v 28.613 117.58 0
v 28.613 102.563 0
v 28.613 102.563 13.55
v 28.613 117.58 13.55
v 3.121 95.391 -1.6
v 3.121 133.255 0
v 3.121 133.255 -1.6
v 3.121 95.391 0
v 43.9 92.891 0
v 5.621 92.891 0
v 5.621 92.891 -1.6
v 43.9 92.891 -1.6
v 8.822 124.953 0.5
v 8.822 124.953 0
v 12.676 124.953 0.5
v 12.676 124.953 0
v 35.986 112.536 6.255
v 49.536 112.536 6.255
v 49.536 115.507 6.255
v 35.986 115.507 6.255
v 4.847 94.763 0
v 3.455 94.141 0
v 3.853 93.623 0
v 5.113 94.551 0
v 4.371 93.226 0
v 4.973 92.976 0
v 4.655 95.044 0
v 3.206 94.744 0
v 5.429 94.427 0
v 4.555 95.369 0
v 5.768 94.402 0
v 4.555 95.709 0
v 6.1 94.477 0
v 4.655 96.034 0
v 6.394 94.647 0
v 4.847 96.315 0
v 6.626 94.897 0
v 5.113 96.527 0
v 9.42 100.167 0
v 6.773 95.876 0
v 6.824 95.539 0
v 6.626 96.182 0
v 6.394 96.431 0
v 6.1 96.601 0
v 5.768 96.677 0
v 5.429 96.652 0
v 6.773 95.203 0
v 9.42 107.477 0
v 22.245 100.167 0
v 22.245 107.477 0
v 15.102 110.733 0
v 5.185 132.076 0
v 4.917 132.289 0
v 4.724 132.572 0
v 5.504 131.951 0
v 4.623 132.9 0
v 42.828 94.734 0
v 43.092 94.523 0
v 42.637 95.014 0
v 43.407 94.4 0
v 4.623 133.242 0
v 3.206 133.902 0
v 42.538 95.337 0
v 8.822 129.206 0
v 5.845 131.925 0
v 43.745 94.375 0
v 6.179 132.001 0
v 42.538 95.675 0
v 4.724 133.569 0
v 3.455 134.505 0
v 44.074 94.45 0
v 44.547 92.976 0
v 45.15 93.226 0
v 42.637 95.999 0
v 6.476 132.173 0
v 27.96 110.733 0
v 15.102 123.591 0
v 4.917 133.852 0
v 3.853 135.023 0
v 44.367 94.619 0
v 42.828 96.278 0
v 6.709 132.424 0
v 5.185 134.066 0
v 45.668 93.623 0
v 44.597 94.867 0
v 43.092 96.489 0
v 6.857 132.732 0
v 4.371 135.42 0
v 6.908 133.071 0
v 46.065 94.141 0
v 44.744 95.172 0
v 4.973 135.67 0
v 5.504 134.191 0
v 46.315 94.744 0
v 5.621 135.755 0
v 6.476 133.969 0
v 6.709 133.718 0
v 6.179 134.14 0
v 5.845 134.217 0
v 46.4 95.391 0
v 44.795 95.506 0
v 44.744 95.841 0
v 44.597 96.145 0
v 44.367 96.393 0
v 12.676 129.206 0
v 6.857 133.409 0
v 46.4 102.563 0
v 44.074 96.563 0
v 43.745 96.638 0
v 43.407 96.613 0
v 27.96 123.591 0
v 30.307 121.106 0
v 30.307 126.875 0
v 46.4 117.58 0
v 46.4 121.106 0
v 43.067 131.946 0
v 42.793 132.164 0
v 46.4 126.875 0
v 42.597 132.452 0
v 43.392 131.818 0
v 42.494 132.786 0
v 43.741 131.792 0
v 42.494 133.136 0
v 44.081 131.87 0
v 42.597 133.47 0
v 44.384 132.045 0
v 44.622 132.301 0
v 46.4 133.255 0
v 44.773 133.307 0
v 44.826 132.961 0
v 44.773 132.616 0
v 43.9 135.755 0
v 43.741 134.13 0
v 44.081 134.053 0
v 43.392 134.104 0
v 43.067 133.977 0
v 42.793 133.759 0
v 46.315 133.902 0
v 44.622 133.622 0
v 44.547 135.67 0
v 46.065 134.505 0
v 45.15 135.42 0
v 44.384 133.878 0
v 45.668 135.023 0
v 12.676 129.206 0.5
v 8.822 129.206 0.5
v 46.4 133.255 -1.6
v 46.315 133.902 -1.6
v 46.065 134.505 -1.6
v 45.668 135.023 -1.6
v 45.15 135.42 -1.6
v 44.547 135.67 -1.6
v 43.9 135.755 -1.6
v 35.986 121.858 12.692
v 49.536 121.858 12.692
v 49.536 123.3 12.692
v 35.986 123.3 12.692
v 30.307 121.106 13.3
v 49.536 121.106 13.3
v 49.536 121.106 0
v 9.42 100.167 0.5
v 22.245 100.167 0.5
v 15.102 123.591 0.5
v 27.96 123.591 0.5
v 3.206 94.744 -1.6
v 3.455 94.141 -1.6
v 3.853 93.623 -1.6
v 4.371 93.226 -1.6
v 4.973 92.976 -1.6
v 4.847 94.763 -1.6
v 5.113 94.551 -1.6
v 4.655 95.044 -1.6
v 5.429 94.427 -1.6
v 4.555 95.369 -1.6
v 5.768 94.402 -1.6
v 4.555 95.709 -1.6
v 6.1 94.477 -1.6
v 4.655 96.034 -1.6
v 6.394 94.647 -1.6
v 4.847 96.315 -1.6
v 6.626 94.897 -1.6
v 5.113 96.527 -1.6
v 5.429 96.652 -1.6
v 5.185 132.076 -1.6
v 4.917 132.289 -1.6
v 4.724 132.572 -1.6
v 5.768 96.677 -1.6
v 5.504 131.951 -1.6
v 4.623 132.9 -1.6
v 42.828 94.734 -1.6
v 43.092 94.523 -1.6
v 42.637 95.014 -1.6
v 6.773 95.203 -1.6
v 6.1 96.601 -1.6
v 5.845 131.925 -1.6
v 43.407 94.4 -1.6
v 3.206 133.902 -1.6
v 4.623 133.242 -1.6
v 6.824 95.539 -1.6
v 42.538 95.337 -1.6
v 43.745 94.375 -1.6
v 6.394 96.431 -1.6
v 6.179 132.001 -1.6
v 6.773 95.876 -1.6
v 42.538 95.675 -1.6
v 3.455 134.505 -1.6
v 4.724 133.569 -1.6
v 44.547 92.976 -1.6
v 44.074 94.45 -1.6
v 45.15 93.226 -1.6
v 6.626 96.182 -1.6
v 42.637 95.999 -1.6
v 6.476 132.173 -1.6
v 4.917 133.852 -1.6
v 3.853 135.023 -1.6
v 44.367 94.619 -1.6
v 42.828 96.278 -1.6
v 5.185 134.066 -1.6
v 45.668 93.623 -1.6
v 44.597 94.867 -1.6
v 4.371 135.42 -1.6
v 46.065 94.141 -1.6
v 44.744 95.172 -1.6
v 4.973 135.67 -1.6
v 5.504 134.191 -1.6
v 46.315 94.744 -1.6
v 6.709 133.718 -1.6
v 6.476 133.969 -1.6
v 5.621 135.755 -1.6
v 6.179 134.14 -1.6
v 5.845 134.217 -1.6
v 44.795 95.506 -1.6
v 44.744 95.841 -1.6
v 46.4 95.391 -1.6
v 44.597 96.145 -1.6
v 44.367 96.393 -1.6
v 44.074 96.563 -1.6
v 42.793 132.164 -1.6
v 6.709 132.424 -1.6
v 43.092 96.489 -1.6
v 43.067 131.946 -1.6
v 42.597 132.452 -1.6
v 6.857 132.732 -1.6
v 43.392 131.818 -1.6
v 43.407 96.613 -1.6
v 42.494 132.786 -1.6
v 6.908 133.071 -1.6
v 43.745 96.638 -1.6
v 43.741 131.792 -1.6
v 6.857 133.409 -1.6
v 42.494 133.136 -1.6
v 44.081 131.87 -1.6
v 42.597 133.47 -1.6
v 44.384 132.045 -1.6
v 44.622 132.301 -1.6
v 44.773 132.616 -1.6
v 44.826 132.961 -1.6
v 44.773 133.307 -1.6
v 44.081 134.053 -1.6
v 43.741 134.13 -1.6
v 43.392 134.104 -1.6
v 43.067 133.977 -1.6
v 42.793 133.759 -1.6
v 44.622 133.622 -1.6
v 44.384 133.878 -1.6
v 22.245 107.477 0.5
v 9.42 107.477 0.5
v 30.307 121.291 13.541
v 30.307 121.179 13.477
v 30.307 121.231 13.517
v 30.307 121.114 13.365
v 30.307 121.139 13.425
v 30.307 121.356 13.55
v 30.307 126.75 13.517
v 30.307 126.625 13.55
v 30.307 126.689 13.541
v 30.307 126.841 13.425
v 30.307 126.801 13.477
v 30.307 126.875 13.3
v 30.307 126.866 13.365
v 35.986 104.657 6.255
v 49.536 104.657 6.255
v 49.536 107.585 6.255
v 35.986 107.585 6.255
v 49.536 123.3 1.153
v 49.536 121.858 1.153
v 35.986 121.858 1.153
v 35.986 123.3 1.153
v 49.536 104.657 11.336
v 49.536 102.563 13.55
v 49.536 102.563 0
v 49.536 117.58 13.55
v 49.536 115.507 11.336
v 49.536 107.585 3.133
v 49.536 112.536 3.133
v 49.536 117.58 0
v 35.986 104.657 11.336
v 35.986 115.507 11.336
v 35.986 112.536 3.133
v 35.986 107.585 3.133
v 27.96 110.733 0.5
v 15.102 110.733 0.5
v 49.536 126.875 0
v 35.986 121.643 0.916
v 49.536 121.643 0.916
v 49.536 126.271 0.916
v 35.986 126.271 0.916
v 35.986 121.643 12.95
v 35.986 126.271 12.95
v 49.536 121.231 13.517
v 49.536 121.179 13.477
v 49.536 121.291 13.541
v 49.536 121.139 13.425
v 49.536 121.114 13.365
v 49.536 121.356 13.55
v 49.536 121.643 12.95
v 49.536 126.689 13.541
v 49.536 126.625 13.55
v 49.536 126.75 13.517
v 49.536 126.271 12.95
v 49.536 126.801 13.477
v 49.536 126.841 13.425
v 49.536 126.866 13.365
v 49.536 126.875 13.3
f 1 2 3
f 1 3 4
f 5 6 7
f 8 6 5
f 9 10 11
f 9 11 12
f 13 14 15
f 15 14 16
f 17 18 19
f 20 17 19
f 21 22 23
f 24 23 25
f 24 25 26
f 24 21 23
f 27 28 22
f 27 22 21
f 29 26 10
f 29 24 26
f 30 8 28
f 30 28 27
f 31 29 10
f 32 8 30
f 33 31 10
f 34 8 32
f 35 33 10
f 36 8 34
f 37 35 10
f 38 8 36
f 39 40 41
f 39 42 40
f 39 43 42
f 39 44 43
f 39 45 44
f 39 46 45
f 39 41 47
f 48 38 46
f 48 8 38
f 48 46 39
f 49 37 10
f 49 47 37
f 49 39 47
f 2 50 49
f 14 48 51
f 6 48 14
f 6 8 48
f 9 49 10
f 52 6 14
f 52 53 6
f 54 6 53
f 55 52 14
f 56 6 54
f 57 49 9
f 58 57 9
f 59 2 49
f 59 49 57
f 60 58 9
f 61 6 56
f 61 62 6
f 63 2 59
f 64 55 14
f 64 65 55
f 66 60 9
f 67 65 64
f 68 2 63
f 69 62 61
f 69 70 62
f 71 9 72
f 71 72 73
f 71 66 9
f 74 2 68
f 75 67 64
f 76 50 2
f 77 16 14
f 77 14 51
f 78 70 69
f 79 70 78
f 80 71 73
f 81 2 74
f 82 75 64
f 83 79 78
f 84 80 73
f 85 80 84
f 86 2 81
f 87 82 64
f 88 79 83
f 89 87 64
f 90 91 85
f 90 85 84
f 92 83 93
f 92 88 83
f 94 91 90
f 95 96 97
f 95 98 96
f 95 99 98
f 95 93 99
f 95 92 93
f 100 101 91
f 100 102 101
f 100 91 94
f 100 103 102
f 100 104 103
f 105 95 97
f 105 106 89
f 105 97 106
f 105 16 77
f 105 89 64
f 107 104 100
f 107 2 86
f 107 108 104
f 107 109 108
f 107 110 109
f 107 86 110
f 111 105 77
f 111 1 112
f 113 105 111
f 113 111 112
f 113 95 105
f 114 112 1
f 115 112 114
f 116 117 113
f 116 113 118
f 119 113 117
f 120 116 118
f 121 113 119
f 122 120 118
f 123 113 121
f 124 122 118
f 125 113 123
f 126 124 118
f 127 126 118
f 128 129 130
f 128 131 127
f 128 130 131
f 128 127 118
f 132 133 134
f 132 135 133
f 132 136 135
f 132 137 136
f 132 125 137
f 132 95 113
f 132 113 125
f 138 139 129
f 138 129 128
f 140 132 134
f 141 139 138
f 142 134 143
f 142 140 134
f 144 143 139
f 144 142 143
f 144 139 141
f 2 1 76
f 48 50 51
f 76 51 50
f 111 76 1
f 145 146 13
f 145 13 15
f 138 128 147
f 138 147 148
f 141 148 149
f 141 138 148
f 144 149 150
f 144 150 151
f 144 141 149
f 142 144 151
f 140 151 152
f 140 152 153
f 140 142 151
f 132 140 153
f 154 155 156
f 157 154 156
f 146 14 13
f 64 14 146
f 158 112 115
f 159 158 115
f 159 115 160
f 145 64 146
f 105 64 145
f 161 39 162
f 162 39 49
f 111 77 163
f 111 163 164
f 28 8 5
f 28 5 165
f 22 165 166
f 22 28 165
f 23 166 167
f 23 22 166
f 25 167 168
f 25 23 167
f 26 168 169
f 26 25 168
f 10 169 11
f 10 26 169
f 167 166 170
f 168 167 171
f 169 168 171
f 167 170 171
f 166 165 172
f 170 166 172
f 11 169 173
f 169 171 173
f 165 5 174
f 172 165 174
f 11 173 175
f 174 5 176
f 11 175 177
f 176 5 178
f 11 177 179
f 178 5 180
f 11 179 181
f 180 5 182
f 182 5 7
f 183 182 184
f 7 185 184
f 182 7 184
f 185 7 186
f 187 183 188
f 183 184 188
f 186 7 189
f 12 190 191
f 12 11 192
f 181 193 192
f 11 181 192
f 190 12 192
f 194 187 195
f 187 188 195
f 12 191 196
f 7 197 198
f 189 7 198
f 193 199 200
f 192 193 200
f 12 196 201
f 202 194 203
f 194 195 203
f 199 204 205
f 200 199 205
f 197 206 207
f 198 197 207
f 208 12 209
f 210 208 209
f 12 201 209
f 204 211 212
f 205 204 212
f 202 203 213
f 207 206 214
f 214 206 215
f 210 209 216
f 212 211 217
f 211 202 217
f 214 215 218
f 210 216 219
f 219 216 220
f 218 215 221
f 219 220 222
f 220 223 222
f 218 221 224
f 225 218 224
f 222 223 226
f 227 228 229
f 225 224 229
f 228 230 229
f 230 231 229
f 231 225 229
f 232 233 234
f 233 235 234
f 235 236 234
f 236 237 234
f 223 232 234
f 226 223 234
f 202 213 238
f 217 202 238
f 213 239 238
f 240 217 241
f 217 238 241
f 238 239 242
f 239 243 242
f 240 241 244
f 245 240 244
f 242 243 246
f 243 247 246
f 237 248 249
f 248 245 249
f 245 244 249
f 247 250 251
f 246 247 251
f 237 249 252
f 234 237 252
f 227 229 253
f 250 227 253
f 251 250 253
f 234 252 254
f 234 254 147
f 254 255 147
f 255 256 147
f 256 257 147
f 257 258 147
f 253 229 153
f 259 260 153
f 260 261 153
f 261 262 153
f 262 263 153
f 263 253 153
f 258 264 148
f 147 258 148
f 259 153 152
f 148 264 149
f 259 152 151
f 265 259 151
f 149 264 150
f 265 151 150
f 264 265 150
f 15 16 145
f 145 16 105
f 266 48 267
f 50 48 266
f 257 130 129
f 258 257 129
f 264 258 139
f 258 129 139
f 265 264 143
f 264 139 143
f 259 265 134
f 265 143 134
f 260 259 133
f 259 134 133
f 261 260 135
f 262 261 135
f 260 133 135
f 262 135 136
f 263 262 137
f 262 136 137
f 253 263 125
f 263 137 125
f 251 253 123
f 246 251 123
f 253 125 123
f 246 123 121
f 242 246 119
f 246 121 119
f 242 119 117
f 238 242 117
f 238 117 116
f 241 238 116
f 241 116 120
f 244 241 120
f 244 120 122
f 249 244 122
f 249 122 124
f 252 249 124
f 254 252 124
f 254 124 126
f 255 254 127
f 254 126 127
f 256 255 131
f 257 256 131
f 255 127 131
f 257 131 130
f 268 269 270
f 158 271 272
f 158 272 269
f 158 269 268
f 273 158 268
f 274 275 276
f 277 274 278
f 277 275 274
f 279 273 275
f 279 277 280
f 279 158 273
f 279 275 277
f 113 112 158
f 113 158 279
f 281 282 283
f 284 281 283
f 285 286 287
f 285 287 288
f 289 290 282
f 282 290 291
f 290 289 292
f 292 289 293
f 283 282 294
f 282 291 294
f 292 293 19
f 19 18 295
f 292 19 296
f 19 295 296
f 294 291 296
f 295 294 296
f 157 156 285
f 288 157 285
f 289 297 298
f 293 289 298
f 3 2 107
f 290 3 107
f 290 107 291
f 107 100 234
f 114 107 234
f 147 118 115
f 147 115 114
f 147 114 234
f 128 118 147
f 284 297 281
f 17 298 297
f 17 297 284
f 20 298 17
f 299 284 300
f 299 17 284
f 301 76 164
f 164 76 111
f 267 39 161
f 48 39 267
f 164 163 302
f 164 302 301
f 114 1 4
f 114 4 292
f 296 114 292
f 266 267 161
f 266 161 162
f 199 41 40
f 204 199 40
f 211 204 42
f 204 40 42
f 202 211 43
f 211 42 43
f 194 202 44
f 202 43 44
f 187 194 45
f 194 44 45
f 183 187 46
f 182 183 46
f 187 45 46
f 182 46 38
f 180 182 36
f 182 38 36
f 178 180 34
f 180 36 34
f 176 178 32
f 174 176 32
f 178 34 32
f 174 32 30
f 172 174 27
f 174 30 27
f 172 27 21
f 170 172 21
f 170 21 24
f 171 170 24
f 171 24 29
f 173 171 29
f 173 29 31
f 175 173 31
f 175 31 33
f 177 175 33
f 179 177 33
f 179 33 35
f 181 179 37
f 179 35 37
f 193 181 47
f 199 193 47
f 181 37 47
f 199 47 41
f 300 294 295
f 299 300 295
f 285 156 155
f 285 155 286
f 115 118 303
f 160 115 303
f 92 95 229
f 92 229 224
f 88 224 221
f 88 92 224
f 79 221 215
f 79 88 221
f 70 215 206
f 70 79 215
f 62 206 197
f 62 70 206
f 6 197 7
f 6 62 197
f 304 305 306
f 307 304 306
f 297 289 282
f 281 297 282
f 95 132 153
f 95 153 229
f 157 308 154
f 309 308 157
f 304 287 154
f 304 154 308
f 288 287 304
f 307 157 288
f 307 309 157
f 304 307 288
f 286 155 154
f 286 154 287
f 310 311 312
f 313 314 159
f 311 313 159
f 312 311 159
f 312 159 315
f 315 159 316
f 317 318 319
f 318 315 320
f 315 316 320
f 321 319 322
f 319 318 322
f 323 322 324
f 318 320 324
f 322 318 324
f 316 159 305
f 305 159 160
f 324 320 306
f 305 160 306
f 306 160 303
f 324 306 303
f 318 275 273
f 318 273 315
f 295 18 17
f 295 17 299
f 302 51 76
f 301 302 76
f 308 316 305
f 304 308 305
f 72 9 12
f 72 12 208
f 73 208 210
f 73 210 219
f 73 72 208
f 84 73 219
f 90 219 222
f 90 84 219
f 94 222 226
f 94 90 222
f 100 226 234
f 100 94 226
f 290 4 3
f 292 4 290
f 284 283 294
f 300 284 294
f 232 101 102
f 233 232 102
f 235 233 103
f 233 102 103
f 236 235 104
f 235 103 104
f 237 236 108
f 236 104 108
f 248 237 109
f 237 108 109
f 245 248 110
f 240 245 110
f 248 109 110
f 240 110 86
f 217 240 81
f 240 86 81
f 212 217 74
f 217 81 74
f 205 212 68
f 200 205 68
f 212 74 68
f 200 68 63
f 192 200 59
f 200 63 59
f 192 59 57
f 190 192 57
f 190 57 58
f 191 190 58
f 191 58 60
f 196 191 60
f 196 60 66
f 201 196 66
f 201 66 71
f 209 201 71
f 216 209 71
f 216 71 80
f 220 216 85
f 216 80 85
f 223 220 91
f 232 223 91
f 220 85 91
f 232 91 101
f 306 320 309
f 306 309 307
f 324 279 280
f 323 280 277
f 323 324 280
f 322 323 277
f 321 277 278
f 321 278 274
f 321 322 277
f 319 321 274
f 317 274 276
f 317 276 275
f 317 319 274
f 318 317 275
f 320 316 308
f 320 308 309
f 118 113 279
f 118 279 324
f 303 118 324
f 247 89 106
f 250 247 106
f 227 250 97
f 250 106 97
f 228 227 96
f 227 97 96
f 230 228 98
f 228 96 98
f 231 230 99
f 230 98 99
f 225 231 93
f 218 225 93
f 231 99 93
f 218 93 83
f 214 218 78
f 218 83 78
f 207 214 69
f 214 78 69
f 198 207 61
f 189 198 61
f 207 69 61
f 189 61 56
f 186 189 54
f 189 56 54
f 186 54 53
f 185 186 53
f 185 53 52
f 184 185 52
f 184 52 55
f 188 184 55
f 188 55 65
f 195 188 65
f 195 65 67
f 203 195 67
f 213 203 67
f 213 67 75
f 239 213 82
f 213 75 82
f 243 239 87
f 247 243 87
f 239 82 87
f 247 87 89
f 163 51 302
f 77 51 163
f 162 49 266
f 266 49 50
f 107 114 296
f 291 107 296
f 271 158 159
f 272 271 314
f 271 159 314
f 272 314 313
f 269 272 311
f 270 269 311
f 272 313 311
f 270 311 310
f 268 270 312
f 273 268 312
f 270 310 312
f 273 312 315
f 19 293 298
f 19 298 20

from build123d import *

# Parameters (mm, degrees)
BOSS_EXTRU_1_DEPTH      = 1.6
ESQUISSE3_R             = 1.148870596
ESQUISSE3_R_2           = 1.140783705
ESQUISSE3_R_3           = 1.172524647
ESQUISSE3_R_4           = 1.134797555
ENL_V_MAT_EXTRU_1_DEPTH = 1.6
COMPOSANTS_W            = 12.858194584
COMPOSANTS_H            = 12.858194584
COMPOSANTS_W_2          = 12.824969275
COMPOSANTS_H_2          = 7.30956798
COMPOSANTS_W_3          = 3.854135844
COMPOSANTS_H_3          = 4.252839552
BOSS_EXTRU_2_DEPTH      = 0.5
USB_W                   = 19.229644045
USB_H                   = 5.768893213
USB_W_2                 = 20.923684115
USB_H_2                 = 15.017436302
BOSS_EXTRU_3_DEPTH      = 13.55
ESQUISSE6_W             = 5.080672097
ESQUISSE6_H             = 10.850248885
ENL_V_MAT_EXTRU_2_DEPTH = 13.55
ESQUISSE7_W             = 3.121599382
ESQUISSE7_H             = 4.951502468
ENL_V_MAT_EXTRU_3_DEPTH = 13.55
ESQUISSE8_W             = 12.034303823
ESQUISSE8_H             = 4.628578393
ENL_V_MAT_EXTRU_4_DEPTH = 13.55
ESQUISSE9_W             = 11.539153577
ESQUISSE9_H             = 1.442394197
BOSS_EXTRU_4_DEPTH      = 13.55
CONG_1_R                = 0.25


with BuildPart() as part:
    # plaque → Boss.-Extru.1 (new body)
    with BuildSketch(Plane.XY):
        with BuildLine():
            Line((43.900262464, 135.755357431), (5.620539516, 135.755357431))
            ThreePointArc((5.620539516, 135.755357431), (3.852772563, 135.023124384), (3.120539516, 133.255357431))
            Line((3.120539516, 133.255357431), (3.120539516, 95.39098691))
            ThreePointArc((3.120539516, 95.39098691), (3.852772563, 93.623219957), (5.620539516, 92.89098691))
            Line((5.620539516, 92.89098691), (43.900262464, 92.89098691))
            ThreePointArc((43.900262464, 92.89098691), (45.668029417, 93.623219957), (46.400262464, 95.39098691))
            Line((46.400262464, 95.39098691), (46.400262464, 133.255357431))
            ThreePointArc((46.400262464, 133.255357431), (45.668029417, 135.023124384), (43.900262464, 135.755357431))
        make_face()
    extrude(amount=-BOSS_EXTRU_1_DEPTH)

    # Esquisse3 → Enlèv. mat.-Extru.1 (cut)
    with BuildSketch(Plane.XY):
        with Locations((5.759516269, 133.070860948)):
            Circle(ESQUISSE3_R)
        with Locations((5.683227949, 95.539332189)):
            Circle(ESQUISSE3_R_2)
        with Locations((43.653009493, 132.961233721)):
            Circle(ESQUISSE3_R_3)
        with Locations((43.659821284, 95.506212136)):
            Circle(ESQUISSE3_R_4)
    extrude(amount=-ENL_V_MAT_EXTRU_1_DEPTH, mode=Mode.SUBTRACT)

    # composants → Boss.-Extru.2 (add)
    with BuildSketch(Plane.XY):
        with Locations((21.530912713, 117.16211726)):
            Rectangle(COMPOSANTS_W, COMPOSANTS_H)
        with Locations((15.832772219, 103.822155695)):
            Rectangle(COMPOSANTS_W_2, COMPOSANTS_H_2)
        with Locations((10.749299941, 127.079871998)):
            Rectangle(COMPOSANTS_W_3, COMPOSANTS_H_3)
    extrude(amount=BOSS_EXTRU_2_DEPTH)

    # usb → Boss.-Extru.3 (add)
    with BuildSketch(Plane.XY):
        with Locations((39.921367739, 123.990139203)):
            Rectangle(USB_W, USB_H)
        with Locations((39.074347704, 110.071539704)):
            Rectangle(USB_W_2, USB_H_2)
    extrude(amount=BOSS_EXTRU_3_DEPTH)

    # Esquisse6 → Enlèv. mat.-Extru.2 (cut)
    with BuildSketch(Plane(origin=(49.536189761, 0, 0), x_dir=(0, 0, -1), z_dir=(1, 0, 0))):
        with Locations((-8.79520358, 110.082102666)):
            Rectangle(ESQUISSE6_W, ESQUISSE6_H)
    extrude(amount=-ENL_V_MAT_EXTRU_2_DEPTH, mode=Mode.SUBTRACT)

    # Esquisse7 → Enlèv. mat.-Extru.3 (cut)
    with BuildSketch(Plane(origin=(49.536189761, 0, 0), x_dir=(0, 0, -1), z_dir=(1, 0, 0))):
        with Locations((-4.69406784, 110.060574394)):
            Rectangle(ESQUISSE7_W, ESQUISSE7_H)
    extrude(amount=-ENL_V_MAT_EXTRU_3_DEPTH, mode=Mode.SUBTRACT)

    # Esquisse8 → Enlèv. mat.-Extru.4 (cut)
    with BuildSketch(Plane(origin=(49.536189761, 0, 0), x_dir=(0, 0, -1), z_dir=(1, 0, 0))):
        with Locations((-6.933008087, 123.957073711)):
            Rectangle(ESQUISSE8_W, ESQUISSE8_H)
    extrude(amount=-ENL_V_MAT_EXTRU_4_DEPTH, mode=Mode.SUBTRACT)

    # Esquisse9 → Boss.-Extru.4 (add)
    with BuildSketch(Plane(origin=(35.986189761, 0, 0), x_dir=(0, 0, -1), z_dir=(1, 0, 0))):
        with Locations((-6.922243951, 122.579264329)):
            Rectangle(ESQUISSE9_W, ESQUISSE9_H)
    extrude(amount=BOSS_EXTRU_4_DEPTH)

    # Congé1
    cong_1_edges = [part.edges().sort_by_distance(p)[0] for p in [
        (39.921367738, 121.105692596, 13.55),
        (39.921367738, 126.874585809, 13.55),
    ]]
    fillet(cong_1_edges, radius=CONG_1_R)


solid = part.part
